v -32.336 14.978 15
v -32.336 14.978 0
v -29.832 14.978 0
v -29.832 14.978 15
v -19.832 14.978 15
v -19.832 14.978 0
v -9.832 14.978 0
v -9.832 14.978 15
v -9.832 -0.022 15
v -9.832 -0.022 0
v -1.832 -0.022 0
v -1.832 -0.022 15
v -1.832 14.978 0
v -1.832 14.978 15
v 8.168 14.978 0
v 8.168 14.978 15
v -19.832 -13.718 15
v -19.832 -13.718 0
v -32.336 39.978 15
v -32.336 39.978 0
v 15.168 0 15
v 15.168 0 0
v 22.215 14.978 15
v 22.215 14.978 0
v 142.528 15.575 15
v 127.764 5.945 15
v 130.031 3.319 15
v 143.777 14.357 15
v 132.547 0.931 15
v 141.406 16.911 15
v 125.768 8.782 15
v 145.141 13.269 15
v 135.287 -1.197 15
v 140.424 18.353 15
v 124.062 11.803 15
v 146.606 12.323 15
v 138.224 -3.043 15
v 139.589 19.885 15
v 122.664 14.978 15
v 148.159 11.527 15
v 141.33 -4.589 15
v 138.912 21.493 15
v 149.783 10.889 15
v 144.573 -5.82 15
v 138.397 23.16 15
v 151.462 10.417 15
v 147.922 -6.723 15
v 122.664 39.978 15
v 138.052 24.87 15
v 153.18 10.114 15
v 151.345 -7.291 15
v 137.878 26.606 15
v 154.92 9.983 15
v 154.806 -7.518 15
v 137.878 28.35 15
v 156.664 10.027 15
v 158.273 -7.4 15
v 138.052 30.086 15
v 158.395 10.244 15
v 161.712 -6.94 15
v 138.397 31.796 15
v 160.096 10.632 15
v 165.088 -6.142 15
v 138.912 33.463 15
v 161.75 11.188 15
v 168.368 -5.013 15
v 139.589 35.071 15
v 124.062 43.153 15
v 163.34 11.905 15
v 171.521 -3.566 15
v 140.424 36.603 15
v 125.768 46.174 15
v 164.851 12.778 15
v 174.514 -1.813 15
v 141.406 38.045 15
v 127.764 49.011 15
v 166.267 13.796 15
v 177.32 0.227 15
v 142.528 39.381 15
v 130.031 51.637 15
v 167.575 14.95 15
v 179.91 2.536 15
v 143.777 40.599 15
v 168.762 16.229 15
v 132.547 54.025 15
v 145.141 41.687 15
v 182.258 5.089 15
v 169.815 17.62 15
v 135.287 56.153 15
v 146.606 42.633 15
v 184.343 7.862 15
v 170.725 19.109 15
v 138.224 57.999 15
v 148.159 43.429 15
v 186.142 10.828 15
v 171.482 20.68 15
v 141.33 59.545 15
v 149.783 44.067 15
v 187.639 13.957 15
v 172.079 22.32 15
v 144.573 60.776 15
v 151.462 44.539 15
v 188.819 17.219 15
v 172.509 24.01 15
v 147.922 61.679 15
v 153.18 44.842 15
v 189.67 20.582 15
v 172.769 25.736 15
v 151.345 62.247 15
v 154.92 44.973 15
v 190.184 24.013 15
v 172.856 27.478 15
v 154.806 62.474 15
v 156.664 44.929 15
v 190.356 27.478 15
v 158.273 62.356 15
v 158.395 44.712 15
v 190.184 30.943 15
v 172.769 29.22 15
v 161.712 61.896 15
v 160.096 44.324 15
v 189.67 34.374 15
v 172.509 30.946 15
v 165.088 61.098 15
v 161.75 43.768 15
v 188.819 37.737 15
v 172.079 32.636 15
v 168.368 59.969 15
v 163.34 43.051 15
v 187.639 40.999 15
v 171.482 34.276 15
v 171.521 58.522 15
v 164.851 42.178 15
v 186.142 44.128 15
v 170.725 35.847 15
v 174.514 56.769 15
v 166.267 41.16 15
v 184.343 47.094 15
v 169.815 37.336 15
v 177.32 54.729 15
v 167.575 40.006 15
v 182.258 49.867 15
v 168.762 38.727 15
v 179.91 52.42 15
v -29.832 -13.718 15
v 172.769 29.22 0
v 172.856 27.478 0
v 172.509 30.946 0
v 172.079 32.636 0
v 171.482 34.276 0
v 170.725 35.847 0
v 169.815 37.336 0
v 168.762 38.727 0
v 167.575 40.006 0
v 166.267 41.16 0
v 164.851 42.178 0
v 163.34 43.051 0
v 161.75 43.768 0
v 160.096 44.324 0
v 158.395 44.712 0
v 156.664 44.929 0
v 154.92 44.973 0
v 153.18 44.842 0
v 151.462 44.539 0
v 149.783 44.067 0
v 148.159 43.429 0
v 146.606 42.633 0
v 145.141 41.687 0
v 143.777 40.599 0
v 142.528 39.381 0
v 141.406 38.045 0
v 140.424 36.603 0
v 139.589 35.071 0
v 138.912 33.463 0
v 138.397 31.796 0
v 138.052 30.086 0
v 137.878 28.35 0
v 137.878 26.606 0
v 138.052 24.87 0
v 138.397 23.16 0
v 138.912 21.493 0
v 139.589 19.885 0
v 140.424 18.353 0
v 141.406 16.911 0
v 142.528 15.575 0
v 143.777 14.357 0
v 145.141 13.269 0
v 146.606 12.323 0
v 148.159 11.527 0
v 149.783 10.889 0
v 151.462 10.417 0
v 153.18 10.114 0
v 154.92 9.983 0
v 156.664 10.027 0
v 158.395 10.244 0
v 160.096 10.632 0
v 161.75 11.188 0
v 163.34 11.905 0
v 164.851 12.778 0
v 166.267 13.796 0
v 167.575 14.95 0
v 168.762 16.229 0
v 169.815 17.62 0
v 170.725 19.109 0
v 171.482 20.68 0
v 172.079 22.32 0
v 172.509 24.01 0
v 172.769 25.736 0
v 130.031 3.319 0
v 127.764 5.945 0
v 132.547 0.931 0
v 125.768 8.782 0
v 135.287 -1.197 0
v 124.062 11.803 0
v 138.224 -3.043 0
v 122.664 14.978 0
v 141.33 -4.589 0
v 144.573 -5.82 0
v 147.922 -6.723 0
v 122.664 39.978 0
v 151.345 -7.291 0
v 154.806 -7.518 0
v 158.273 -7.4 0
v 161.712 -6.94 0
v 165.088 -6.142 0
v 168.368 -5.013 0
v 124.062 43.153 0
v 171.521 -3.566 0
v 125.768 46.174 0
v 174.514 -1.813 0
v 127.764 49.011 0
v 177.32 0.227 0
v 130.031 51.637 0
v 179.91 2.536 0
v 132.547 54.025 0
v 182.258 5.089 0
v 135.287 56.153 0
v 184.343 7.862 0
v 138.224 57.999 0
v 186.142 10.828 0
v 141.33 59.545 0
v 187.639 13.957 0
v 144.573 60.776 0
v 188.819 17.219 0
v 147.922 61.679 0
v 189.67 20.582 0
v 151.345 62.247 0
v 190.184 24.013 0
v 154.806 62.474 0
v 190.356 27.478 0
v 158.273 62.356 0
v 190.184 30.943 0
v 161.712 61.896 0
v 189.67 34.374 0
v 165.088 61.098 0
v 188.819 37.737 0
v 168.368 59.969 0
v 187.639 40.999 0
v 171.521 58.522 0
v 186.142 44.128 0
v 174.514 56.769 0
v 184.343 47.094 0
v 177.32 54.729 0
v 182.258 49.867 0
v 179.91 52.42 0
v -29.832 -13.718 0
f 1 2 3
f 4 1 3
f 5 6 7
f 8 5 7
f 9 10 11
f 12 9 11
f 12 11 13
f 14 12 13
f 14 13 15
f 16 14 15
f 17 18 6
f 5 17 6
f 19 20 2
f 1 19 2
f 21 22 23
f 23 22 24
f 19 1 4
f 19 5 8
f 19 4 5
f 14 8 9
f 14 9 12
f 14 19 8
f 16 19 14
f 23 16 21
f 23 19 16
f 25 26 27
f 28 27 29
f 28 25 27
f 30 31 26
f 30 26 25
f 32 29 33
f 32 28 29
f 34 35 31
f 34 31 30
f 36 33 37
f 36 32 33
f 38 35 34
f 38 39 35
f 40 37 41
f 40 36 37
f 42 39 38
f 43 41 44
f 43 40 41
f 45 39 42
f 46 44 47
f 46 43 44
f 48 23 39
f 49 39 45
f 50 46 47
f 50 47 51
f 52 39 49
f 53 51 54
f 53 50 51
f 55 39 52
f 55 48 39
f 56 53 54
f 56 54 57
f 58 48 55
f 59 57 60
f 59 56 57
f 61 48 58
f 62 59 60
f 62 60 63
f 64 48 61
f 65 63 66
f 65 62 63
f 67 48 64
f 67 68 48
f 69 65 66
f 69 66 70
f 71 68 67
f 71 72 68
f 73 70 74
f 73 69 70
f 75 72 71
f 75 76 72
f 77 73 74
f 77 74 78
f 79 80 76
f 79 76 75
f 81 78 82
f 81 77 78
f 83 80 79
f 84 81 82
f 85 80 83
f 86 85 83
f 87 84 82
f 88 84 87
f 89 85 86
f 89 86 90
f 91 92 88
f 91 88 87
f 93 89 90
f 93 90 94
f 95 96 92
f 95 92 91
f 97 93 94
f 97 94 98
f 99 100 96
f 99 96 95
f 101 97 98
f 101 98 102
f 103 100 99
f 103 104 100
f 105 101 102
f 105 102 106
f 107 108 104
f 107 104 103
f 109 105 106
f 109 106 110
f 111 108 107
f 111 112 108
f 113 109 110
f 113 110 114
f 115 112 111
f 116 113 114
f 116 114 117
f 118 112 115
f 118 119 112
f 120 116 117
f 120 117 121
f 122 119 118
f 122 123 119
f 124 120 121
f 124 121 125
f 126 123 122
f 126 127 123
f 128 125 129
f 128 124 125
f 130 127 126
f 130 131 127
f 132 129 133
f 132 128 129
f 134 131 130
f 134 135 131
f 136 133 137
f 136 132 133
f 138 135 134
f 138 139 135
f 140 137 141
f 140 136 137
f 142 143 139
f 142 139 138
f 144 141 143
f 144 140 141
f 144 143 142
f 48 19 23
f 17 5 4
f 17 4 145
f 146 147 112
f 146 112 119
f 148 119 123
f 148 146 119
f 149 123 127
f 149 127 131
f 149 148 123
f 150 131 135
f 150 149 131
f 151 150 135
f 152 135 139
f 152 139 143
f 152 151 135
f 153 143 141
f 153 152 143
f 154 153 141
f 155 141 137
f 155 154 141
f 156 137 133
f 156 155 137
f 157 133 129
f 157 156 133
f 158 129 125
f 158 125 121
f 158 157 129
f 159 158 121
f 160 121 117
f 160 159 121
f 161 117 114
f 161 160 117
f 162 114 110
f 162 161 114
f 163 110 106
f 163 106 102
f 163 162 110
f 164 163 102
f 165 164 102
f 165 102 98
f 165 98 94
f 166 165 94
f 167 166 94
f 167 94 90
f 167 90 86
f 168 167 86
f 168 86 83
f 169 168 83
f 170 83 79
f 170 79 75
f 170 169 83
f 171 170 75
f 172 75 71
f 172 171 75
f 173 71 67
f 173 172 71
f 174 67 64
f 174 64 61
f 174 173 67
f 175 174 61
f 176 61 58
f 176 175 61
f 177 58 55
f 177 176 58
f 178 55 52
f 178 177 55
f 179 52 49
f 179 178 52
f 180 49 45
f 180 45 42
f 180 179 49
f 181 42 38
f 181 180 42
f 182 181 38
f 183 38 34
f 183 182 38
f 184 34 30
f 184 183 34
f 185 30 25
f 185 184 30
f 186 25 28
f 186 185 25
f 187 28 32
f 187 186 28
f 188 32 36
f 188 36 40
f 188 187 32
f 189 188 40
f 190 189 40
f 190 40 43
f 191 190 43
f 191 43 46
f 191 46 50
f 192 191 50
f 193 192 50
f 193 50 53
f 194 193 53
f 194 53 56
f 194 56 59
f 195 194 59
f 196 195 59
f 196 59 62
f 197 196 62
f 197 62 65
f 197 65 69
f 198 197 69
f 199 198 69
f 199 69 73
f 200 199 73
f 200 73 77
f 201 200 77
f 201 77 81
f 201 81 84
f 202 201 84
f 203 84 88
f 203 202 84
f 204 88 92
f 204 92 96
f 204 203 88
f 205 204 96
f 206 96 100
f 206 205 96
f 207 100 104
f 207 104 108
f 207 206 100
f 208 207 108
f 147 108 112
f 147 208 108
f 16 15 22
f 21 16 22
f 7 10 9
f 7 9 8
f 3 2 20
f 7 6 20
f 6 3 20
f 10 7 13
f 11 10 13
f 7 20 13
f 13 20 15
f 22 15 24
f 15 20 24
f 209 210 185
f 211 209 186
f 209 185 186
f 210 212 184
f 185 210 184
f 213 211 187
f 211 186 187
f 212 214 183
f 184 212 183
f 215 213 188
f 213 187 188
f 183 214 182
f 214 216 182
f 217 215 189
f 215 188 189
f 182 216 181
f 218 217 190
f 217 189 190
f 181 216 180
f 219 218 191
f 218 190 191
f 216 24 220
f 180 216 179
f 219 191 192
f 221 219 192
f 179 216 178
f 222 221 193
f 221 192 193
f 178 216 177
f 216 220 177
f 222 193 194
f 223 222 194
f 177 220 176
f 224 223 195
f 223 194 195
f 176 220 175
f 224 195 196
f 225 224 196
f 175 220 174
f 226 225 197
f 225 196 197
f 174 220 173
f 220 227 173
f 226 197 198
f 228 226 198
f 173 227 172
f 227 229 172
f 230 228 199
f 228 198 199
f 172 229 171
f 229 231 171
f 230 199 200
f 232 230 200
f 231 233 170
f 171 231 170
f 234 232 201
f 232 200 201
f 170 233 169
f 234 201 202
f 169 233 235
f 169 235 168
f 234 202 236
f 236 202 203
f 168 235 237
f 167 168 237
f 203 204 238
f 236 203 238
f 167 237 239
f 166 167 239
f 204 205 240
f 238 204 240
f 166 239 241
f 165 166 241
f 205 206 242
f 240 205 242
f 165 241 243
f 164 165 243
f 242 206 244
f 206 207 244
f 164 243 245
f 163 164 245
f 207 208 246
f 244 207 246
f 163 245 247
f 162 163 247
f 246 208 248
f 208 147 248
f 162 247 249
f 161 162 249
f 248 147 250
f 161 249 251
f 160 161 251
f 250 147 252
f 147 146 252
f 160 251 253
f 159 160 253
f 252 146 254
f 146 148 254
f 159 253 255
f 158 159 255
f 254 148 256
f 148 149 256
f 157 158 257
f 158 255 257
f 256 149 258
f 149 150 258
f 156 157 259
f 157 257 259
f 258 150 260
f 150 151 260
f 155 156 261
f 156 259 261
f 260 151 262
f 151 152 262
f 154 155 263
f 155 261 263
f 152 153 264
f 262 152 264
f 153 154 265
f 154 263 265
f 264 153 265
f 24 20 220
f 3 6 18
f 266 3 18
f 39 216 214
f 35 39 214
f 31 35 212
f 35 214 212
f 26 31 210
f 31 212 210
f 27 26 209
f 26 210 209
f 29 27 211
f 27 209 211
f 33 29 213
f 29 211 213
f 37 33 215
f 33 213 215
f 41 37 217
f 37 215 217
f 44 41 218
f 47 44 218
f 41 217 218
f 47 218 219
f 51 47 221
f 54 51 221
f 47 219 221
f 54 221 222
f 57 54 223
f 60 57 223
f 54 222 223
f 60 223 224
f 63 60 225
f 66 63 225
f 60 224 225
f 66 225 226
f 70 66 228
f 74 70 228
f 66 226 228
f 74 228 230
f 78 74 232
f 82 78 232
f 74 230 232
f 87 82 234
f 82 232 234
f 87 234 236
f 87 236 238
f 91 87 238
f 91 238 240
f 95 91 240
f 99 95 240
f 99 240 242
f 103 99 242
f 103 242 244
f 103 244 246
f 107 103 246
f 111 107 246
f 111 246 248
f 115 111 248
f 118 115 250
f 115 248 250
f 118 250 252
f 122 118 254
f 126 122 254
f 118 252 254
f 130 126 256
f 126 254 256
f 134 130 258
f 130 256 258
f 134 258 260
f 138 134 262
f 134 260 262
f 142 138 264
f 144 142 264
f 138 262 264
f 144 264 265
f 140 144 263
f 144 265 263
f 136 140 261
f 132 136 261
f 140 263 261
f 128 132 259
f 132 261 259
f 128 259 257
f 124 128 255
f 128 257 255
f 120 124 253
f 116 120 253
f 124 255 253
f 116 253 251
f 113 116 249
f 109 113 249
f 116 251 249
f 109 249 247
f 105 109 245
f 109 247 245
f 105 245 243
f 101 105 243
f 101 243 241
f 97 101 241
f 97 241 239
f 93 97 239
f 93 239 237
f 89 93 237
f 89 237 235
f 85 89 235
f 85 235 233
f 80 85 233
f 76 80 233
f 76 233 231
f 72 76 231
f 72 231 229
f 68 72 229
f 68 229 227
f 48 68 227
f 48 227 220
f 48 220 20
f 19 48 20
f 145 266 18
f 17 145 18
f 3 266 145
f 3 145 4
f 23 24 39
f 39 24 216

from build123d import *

# Parameters (mm, degrees)
F0_R     = 17.5
F0_W     = 10
F0_H     = 28.6961602334
F0_W_2   = 8
F0_H_2   = 15
F1_DEPTH = 15


# Not quite as in the source:
# - a feature of the source that left no trace in its solid (it failed there, or was rolled back) is left out


with BuildPart() as f1:
    # F0 (on Top) → F1 (new body)
    with BuildSketch(Plane.XY):
        Polygon((122.6644553625, 14.977986814), (122.6644553625, 39.977986814), (-32.3355446375, 39.977986814), (-32.3355446375, 14.977986814), (-29.8321247846, 14.977986814), (-19.8321247846, 14.977986814), (-9.8321247846, 14.977986814), (-1.8321247846, 14.977986814), (8.1678752154, 14.977986814), (22.2149824233, 14.977986814), align=None)
        with BuildLine():
            ThreePointArc((122.6644553625, 14.977986814), (190.356197439, 27.477986814), (122.6644553625, 39.977986814))
            Line((122.6644553625, 39.977986814), (122.6644553625, 14.977986814))
        make_face()
        with Locations((155.356197439, 27.477986814)):
            Circle(F0_R, mode=Mode.SUBTRACT)
        with Locations((-24.8321247846, 0.6299066973)):
            Rectangle(F0_W, F0_H)
        with Locations((-5.8321247846, 7.477986814)):
            Rectangle(F0_W_2, F0_H_2)
        Polygon((15.1678752154, 0), (22.2149824233, 14.977986814), (8.1678752154, 14.977986814), align=None)
    extrude(amount=F1_DEPTH)


solid = f1.part
